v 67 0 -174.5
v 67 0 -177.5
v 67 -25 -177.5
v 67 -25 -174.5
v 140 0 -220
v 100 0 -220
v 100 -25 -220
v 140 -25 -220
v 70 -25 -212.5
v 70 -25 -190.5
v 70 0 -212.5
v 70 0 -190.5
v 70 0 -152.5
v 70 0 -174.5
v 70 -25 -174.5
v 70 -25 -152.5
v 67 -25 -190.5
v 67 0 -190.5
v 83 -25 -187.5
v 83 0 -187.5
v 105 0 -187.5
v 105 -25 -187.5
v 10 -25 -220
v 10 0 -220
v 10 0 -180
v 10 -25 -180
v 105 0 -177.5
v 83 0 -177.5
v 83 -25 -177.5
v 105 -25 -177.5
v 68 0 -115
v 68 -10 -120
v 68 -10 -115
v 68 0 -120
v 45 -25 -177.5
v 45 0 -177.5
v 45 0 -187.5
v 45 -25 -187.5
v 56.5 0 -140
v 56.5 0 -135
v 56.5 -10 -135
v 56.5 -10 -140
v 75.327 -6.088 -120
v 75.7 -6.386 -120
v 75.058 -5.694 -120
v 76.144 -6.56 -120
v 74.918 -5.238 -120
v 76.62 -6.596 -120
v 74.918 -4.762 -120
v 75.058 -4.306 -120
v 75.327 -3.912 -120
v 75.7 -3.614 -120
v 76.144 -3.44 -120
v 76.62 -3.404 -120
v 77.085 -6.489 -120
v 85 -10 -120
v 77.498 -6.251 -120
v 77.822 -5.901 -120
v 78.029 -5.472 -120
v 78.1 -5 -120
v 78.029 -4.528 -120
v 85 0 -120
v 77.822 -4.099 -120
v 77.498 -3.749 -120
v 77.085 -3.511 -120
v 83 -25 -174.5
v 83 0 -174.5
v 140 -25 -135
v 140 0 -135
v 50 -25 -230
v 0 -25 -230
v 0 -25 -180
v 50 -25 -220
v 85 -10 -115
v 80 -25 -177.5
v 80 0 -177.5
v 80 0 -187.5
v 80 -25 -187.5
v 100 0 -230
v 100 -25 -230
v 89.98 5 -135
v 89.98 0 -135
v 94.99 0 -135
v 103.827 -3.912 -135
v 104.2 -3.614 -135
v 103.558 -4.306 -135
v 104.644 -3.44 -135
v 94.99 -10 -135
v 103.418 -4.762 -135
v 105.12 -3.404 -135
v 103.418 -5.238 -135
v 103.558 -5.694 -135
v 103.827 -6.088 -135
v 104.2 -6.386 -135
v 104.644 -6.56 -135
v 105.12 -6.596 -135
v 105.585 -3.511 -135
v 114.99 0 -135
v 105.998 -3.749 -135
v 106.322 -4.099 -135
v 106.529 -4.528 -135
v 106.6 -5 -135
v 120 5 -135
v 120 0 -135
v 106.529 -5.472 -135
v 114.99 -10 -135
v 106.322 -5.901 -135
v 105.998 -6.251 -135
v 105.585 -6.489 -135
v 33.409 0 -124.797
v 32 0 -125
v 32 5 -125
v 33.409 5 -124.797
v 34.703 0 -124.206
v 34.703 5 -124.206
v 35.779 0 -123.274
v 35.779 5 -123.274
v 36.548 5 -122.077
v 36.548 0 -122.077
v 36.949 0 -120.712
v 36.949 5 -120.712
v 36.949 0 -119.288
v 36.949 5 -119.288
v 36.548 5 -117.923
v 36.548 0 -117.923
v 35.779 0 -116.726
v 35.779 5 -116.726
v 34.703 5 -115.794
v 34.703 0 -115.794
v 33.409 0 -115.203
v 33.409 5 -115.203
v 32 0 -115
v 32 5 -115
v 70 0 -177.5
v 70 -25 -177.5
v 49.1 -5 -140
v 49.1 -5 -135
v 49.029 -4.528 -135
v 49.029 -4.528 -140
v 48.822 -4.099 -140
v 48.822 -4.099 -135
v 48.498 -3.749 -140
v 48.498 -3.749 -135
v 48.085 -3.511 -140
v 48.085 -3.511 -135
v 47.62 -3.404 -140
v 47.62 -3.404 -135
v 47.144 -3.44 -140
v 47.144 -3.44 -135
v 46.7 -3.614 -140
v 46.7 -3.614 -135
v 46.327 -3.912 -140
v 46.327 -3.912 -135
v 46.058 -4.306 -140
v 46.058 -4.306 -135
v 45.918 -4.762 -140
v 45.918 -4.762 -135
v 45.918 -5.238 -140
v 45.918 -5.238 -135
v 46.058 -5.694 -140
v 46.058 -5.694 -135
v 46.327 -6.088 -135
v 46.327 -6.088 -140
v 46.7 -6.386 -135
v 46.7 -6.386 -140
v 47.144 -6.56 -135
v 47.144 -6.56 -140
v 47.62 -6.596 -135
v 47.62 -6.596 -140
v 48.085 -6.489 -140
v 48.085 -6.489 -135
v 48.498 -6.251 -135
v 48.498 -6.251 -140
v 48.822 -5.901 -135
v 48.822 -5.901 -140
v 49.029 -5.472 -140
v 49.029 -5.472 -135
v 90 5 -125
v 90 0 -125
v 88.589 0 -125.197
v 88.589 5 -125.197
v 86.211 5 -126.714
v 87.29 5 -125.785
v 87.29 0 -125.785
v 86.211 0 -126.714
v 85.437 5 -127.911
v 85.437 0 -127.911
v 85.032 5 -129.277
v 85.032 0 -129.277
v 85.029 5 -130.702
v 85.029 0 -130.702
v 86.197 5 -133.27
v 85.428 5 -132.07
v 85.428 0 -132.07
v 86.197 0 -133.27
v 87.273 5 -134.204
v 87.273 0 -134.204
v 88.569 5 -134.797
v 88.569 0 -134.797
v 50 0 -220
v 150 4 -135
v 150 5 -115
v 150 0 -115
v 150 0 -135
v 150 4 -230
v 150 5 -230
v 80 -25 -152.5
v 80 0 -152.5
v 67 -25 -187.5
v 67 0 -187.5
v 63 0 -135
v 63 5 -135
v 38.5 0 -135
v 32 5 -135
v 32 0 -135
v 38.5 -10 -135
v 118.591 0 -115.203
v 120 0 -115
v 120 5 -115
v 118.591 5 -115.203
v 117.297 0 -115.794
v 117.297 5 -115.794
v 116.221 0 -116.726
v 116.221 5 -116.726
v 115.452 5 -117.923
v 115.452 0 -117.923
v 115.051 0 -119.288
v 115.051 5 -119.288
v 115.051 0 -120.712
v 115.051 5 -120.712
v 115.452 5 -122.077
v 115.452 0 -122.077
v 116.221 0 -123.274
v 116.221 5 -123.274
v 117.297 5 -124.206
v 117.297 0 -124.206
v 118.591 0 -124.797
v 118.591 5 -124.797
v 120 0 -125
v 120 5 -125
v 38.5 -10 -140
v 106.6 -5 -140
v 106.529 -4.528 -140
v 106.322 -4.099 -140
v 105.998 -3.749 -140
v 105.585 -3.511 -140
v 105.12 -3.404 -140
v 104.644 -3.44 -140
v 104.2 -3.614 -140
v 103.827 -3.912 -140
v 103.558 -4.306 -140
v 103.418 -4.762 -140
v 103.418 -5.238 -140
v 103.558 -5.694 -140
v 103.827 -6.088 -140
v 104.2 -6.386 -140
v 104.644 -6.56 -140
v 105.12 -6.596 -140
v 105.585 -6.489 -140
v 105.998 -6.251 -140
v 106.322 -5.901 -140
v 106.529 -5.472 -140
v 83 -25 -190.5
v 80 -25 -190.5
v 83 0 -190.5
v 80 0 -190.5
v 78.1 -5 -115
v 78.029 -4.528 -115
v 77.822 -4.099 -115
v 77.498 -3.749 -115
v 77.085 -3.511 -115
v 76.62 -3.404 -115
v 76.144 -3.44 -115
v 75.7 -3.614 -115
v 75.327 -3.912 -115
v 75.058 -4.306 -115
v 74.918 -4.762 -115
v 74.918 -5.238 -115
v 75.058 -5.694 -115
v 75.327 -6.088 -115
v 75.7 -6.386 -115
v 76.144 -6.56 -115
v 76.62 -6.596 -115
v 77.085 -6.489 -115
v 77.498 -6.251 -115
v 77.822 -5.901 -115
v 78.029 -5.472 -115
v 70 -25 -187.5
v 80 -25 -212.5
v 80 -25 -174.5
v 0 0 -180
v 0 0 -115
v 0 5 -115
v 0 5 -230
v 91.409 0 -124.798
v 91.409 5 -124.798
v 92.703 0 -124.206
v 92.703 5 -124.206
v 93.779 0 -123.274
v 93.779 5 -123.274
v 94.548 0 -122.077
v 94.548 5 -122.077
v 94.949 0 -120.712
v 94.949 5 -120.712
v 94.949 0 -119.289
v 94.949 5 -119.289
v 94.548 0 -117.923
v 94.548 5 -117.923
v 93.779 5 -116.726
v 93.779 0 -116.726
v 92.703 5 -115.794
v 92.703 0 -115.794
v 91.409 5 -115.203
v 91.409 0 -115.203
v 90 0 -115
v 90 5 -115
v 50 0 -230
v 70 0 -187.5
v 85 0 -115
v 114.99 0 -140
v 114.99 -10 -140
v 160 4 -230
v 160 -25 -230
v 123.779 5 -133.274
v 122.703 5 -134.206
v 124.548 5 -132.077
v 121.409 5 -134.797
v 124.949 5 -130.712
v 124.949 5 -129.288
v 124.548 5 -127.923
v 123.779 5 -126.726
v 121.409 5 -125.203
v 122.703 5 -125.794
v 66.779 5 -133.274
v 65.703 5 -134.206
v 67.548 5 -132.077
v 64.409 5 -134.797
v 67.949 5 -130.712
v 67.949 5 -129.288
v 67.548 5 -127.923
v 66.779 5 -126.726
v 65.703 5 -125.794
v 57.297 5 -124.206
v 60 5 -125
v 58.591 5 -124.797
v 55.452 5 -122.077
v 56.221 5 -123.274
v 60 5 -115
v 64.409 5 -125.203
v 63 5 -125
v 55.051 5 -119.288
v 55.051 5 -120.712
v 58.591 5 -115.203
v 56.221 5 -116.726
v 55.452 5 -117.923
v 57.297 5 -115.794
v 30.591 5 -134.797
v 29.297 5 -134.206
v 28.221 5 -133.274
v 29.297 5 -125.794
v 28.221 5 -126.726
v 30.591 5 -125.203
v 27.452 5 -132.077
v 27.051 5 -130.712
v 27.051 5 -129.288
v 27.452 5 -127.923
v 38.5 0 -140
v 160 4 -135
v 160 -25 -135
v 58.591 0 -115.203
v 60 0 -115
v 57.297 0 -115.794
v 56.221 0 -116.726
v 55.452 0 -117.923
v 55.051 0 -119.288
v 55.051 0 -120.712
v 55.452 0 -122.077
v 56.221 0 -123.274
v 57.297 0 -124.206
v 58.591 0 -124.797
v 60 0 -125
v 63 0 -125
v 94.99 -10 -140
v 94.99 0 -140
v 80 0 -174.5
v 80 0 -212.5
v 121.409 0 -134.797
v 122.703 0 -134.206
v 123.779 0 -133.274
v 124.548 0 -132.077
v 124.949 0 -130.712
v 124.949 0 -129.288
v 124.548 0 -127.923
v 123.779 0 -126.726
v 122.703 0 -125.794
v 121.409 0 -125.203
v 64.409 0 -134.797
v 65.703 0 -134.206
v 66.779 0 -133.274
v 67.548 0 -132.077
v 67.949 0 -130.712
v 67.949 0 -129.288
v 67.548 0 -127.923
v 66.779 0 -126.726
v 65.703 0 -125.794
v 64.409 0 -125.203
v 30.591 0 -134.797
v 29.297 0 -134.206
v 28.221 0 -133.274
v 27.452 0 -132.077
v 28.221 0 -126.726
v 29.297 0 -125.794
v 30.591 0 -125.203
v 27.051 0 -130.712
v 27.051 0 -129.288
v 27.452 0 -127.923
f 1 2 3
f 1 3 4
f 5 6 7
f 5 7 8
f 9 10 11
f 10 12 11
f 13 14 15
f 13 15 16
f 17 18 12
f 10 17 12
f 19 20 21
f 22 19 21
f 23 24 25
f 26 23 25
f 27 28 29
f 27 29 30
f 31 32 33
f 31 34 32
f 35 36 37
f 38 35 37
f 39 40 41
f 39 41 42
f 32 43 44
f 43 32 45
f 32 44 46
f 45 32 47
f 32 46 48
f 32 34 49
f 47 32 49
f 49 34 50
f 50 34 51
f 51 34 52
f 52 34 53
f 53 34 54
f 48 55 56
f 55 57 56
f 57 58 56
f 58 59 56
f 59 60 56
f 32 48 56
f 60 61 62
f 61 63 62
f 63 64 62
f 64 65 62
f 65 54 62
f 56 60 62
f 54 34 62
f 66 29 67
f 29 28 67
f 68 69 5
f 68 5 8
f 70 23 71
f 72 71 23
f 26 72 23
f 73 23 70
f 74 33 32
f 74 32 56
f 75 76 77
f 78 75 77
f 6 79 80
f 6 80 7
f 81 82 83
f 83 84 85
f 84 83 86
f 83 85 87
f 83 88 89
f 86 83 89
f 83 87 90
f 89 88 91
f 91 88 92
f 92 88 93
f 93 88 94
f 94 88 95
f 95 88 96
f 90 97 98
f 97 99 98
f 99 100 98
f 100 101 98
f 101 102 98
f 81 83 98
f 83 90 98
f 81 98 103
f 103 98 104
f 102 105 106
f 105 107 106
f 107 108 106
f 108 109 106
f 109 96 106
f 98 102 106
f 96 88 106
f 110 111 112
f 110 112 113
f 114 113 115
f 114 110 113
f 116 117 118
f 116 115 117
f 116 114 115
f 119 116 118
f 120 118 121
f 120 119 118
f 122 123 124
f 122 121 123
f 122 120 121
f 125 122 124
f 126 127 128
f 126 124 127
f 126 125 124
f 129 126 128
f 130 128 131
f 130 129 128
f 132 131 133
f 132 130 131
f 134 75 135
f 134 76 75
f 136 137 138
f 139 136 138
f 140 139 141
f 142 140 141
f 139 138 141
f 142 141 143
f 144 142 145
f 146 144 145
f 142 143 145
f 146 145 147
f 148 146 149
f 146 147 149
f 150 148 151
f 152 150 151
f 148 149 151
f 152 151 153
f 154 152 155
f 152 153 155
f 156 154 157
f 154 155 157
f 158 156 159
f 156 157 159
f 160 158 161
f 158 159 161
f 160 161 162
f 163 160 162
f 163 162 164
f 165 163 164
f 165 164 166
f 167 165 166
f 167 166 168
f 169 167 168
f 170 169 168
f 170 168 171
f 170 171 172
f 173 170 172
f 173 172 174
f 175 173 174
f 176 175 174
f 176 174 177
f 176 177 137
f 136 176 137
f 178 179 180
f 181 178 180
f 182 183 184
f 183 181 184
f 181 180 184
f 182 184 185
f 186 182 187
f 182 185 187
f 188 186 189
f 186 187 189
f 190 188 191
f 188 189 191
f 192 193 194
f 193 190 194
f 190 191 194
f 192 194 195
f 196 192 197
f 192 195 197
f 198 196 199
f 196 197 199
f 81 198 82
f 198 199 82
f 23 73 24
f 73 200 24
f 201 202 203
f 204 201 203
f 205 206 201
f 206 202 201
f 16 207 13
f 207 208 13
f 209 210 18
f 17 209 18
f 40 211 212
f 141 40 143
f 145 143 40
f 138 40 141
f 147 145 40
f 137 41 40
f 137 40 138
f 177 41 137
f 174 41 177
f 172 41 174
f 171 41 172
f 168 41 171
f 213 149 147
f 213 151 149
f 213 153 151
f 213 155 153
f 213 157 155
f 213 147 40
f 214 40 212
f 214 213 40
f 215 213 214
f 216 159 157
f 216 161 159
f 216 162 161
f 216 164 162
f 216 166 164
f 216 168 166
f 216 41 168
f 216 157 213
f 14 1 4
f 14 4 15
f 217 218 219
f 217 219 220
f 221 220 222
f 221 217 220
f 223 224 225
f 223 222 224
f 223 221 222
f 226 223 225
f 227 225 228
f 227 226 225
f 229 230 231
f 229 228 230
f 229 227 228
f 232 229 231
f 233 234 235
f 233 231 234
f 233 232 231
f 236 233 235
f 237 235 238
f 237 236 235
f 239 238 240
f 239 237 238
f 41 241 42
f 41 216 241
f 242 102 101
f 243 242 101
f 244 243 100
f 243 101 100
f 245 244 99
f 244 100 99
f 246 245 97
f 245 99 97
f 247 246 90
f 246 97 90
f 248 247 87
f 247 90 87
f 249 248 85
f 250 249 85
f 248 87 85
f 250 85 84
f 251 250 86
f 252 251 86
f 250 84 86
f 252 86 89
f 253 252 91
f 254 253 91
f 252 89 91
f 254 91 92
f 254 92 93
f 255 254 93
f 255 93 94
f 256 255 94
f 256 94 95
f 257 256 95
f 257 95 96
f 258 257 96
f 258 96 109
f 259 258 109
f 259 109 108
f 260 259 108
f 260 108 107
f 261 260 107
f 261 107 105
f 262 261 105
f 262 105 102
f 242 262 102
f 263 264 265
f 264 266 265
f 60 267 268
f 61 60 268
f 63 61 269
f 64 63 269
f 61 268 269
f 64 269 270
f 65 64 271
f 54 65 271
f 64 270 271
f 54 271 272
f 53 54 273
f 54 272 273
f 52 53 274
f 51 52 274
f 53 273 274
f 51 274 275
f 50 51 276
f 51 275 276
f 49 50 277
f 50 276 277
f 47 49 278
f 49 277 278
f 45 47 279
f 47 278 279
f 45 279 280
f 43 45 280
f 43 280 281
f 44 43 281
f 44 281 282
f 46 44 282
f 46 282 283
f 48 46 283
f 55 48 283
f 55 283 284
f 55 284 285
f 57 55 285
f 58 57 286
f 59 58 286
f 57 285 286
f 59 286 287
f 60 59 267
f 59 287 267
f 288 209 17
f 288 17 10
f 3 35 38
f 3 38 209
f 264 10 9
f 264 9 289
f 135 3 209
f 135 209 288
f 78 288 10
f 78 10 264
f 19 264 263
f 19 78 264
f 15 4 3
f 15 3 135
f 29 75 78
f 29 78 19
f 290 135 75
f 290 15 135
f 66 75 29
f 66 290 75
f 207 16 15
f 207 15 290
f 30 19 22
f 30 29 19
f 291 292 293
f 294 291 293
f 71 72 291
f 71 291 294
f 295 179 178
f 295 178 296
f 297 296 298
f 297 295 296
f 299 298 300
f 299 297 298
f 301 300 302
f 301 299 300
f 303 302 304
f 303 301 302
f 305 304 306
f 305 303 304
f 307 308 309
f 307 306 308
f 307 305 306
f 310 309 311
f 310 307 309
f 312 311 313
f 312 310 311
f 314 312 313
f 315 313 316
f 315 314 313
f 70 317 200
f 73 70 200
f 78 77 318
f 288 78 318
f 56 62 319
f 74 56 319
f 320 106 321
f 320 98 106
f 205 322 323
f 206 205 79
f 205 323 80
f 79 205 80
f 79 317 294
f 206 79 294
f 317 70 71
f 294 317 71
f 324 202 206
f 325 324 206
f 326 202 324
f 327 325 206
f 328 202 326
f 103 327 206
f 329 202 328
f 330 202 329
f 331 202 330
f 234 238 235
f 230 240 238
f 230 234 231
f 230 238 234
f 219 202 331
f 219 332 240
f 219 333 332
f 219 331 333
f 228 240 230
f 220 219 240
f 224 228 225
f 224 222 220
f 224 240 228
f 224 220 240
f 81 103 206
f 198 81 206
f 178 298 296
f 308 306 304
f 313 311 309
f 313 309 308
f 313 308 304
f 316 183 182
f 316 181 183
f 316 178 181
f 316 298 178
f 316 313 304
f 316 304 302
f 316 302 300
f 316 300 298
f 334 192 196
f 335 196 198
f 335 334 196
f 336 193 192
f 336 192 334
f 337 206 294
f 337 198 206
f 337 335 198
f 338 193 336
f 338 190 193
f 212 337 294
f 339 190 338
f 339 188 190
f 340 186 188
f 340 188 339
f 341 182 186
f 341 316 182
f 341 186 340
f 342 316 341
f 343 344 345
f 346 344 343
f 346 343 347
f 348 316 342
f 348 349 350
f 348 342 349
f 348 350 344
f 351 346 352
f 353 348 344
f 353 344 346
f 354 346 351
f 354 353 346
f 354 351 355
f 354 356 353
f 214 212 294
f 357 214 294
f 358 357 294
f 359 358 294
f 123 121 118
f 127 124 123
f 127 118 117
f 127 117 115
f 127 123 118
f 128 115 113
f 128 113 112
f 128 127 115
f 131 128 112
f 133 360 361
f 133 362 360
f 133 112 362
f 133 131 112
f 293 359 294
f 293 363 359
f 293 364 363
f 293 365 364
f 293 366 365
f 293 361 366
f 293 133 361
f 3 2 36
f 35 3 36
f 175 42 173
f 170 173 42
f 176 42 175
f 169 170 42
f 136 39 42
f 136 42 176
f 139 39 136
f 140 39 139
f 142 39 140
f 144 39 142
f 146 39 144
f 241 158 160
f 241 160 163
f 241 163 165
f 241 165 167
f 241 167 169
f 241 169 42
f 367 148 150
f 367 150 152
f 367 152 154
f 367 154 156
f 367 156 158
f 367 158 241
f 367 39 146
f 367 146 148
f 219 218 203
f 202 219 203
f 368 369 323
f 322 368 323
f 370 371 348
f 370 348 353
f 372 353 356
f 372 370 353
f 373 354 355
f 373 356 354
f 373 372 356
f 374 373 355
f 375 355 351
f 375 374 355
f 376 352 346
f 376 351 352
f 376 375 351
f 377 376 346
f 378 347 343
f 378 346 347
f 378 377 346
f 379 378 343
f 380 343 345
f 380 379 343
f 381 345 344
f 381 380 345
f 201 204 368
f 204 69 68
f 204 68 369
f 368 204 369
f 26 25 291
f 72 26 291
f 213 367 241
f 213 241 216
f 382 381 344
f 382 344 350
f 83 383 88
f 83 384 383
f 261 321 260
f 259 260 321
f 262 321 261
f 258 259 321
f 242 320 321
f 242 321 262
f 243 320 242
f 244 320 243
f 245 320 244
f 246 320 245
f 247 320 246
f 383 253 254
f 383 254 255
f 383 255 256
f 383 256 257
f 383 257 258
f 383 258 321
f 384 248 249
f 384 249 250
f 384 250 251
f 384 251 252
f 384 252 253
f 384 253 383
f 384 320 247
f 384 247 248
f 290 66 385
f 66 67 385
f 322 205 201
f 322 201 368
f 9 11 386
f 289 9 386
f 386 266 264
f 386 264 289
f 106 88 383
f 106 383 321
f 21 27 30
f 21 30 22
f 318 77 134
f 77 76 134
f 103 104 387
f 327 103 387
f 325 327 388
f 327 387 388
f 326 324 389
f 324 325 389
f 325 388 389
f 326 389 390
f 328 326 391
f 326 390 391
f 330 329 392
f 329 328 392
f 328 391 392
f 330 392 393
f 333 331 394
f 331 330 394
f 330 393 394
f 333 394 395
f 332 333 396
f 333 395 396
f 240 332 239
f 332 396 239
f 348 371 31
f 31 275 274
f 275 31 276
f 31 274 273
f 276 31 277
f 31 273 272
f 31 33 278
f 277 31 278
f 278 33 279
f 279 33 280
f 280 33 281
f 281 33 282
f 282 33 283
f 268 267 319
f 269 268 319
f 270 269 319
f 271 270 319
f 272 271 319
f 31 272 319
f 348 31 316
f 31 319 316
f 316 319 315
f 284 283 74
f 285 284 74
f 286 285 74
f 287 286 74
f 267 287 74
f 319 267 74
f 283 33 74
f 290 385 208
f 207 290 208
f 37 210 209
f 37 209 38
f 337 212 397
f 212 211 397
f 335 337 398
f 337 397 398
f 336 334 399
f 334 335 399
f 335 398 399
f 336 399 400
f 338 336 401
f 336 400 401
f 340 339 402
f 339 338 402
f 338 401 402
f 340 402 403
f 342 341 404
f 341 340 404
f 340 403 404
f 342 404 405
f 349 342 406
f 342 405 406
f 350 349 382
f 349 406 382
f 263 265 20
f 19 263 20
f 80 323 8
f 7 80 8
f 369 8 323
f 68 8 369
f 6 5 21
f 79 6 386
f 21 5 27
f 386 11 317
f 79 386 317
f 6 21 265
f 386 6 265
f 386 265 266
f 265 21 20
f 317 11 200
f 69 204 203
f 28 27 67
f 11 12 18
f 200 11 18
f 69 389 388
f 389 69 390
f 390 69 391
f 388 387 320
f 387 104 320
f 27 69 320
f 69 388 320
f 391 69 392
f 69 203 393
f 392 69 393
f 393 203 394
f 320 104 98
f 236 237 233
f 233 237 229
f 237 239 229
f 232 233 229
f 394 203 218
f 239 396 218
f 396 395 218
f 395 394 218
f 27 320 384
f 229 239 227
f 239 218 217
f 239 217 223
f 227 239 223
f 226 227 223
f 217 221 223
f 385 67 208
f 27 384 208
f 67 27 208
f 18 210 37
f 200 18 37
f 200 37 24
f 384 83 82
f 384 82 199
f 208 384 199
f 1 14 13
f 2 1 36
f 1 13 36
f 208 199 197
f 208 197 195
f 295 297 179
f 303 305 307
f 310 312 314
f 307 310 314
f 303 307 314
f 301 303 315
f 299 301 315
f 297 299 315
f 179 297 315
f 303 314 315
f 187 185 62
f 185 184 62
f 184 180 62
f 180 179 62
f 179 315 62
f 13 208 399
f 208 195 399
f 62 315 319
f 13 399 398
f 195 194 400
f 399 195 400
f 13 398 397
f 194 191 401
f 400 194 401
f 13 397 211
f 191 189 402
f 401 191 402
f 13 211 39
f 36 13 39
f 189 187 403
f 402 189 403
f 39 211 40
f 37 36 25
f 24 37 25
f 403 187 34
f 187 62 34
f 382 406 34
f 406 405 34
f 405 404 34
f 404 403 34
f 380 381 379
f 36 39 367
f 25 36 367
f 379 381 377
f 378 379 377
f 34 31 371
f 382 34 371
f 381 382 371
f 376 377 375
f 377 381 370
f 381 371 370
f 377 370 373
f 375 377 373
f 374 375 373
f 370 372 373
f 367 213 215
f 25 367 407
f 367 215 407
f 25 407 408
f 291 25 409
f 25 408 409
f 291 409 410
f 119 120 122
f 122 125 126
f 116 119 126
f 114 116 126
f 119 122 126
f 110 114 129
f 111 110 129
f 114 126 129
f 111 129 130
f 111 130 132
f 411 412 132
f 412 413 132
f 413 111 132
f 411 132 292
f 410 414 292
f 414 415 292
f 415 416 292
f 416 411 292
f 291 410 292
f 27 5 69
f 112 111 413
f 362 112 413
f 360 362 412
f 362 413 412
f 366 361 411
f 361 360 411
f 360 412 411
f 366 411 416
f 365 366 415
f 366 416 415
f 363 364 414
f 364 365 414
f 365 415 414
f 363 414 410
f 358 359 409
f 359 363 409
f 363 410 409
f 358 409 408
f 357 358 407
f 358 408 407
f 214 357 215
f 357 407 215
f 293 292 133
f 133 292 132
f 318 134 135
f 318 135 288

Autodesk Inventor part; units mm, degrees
ref_plane "YZ Plane" through (0, 0, 0) normal (1, 0, 0) x (0, 1, 0)
ref_plane "XZ Plane" through (0, 0, 0) normal (0, 1, 0) x (-1, 0, 0)
ref_plane "XY Plane" through (0, 0, 0) normal (0, 0, 1) x (1, 0, 0)
sketch "puzzle" plane through (0, 0, 0) normal (0, 1, 0) x (-1, 0, 0)
  line L0 (0, -115) -> (-15, -115)
  line L1 (-135, -115) -> (-125, -115)
  line L2 (-135, -115) -> (-150, -115)
  line L3 (-75, -115) -> (-65, -115)
  line L4 (-75, -115) -> (-85.0002, -115)
  line L5 (-105, -135) -> (-94.9796, -135)
  line L6 (-94.9796, -135) -> (-115, -135)
  line L7 (-65, -115) -> (-60, -115)
  line L8 (-60, -125) -> (-63, -125)
  arc A0 (-60, -125) -> (-60, -115) centre (-60, -120) ccw
  arc A1 (-63, -125) -> (-63, -135) centre (-63, -130) ccw
  line L9 (-85.0002, -115) -> (-90.0002, -115)
  line L10 (-94.9796, -135) -> (-89.9796, -135)
  arc A2 (-90.0002, -115) -> (-90, -125) centre (-90.0002, -120) ccw
  arc A3 (-89.9796, -135) -> (-90, -125) centre (-89.9796, -130) ccw
  line L11 (-115, -135) -> (-120, -135)
  line L12 (-125, -115) -> (-120, -115)
  arc A4 (-120, -125) -> (-120, -115) centre (-120, -120) ccw
  arc A5 (-120, -125) -> (-120, -135) centre (-120, -130) ccw
  line L13 (0, -115) -> (-30, -115)
  line L14 (-63, -135) -> (-32.98, -135)
  line L15 (-32.98, -135) -> (-32, -135)
  line L16 (-30, -115) -> (-32, -115)
  arc A6 (-32, -115) -> (-32, -125) centre (-32, -120) ccw
  arc A7 (-32, -135) -> (-32, -125) centre (-32, -130) ccw
  line L17 (0, -115) -> (0, -230)
  line L18 (0, -230) -> (-150, -230)
  line L19 (-150, -230) -> (-150, -115)
  point P0 (0, 0)
  dimension "d22" = 5
  dimension "d23" = 5
  dimension "d24" = 5
  dimension "d25" = 5
  dimension "d26" = 5
  dimension "d76" = 115
extrude "Extrusión4" add sketch "puzzle" along normal blind 5
sketch "Boceto4" plane through (0, 0, 0) normal (0, -1, 0) x (1, 0, 0)
  line L0 (0, -115) -> (0, -230) projected
  line L1 (32, -115) -> (0, -115) projected
  line L2 (0, -230) -> (10, -230)
  line L3 (150, -230) -> (0, -230) projected
  line L4 (10, -180) -> (0, -180)
  line L5 (0, -230) -> (0, -180)
  line L6 (10, -230) -> (50, -230)
  line L7 (50, -230) -> (50, -220)
  line L8 (50, -220) -> (10, -220)
  line L9 (10, -220) -> (10, -180)
  line L10 (150, -230) -> (100, -230)
  line L11 (100, -230) -> (100, -220)
  line L12 (100, -220) -> (140, -220)
  line L13 (140, -220) -> (140, -180)
  line L14 (140, -180) -> (150, -180)
  line L15 (150, -115) -> (150, -230) projected
  line L16 (150, -230) -> (150, -180)
  line L17 (70, -212.5) -> (80, -212.5)
  line L18 (80, -152.5) -> (70, -152.5)
  line L19 (45, -177.5) -> (45, -187.5)
  line L20 (105, -177.5) -> (105, -187.5)
  line L21 (83, -177.5) -> (83, -174.5)
  line L22 (83, -174.5) -> (80, -174.5)
  line L23 (80, -174.5) -> (80, -152.5)
  line L24 (83, -177.5) -> (105, -177.5)
  line L25 (80, -177.5) -> (80, -187.5)
  line L26 (80, -177.5) -> (70, -177.5)
  line L27 (67, -177.5) -> (67, -174.5)
  line L28 (67, -174.5) -> (70, -174.5)
  line L29 (67, -187.5) -> (67, -190.5)
  line L30 (67, -190.5) -> (70, -190.5)
  line L31 (67, -177.5) -> (45, -177.5)
  line L32 (67, -187.5) -> (45, -187.5)
  line L33 (70, -174.5) -> (70, -152.5)
  line L34 (70, -177.5) -> (70, -182.5)
  line L35 (70, -190.5) -> (70, -212.5)
  line L36 (80, -187.5) -> (70, -187.5)
  line L37 (70, -187.5) -> (70, -182.5)
  line L38 (80, -190.5) -> (83, -190.5)
  line L39 (83, -190.5) -> (83, -187.5)
  line L40 (80, -190.5) -> (80, -212.5)
  line L41 (83, -187.5) -> (105, -187.5)
  point P0 (0, 0)
extrude "Extrusión5" add sketch "Boceto4" along normal blind 25
sketch "Boceto5" plane through (0, 0, 0) normal (0, -1, 0) x (1, 0, 0)
  line L0 (85, -115) -> (68, -115)
  line L1 (68, -120) -> (85, -120)
  line L2 (68, -120) -> (68, -115)
  line L3 (85, -120) -> (85, -115)
  line L4 (32, -135) -> (63, -135) projected
  line L5 (47.5, -135) -> (38.5, -135)
  line L6 (38.5, -135) -> (56.5, -135)
  line L7 (56.5, -135) -> (56.5, -140)
  line L8 (56.5, -140) -> (38.5, -140)
  line L9 (38.5, -140) -> (38.5, -135)
  line L10 (120, -135) -> (89.9796, -135) projected
  line L11 (104.9898, -135) -> (94.9898, -135)
  line L12 (94.9898, -135) -> (104.9898, -135)
  line L13 (104.9898, -135) -> (114.9898, -135)
  line L14 (114.9898, -135) -> (114.9898, -140)
  line L15 (114.9898, -140) -> (94.9898, -140)
  line L16 (94.9898, -140) -> (94.9898, -135)
  point P0 (0, 0)
extrude "Extrusión6" add sketch "Boceto5" along normal blind 10
sketch "Boceto6" plane through (89.9796, 5, -135) normal (0, 0, 1) x (1, 0, 0)
  line L0 (10.0204, -5) -> (50.0204, -5) projected
  line L1 (25, -5) -> (15, -5)
  line L2 (25.0102, -5) -> (25.0102, -15) projected
  line L3 (25.0102, -5) -> (25.0102, -15)
  line L4 (25.0102, -15) -> (5.0102, -15) projected
  line L5 (25.0102, -15) -> (5.0102, -15)
  line L6 (15.0204, -5) -> (15.0204, -30) projected
  circle A0 centre (15.0204, -10) radius 1.6
  line L7 (-33.4796, -15) -> (-51.4796, -15) projected
  line L8 (-33.4796, -15) -> (-51.4796, -15)
  circle A1 centre (-42.4796, -10) radius 1.6
  point P0 (-89.9796, -5)
  dimension "d120" = 10
  dimension "d121" = 3.2
  dimension "d123" = 3.2
extrude "Extrusión7" cut sketch "Boceto6" against normal blind 10 contours A0 L6 | L6 A0 | A1
sketch "Boceto7" plane through (32, 5, -135) normal (0, 0, 1) x (1, 0, 0)
  circle A0 centre (15.5, -10) radius 1.6 projected
  circle A1 centre (15.5, -10) radius 1.6
  point P0 (-32, -5)
extrude "Extrusión8" cut sketch "Boceto7" against normal blind 34
sketch "Boceto8" plane through (68, 0, -115) normal (0, 0, 1) x (1, 0, 0)
  line L0 (22.0002, 0) -> (-8, 0) projected
  line L1 (17, 0) -> (0, 0)
  line L2 (0, 0) -> (0, -10)
  line L3 (0, -10) -> (17, -10)
  line L4 (17, -10) -> (17, 0)
  circle A0 centre (8.5, -5) radius 1.6
  point P0 (-68, 0)
  dimension "d128" = 3.2
extrude "Extrusión9" cut sketch "Boceto8" against normal blind 5 contours A0
sketch "Boceto9" plane through (150, 0, -115) normal (1, 0, 0) x (0, 0, -1)
  line L0 (115, 5) -> (115, -25) projected
  line L1 (20, 0) -> (10, 0) projected
  line L2 (115, 0) -> (20, 0)
  line L3 (20, 0) -> (20, -25)
  line L4 (115, -25) -> (65, -25) projected
  line L5 (20, -25) -> (115, -25)
  line L6 (115, -25) -> (115, 0)
  line L7 (115, 5) -> (115, -25) projected
  point P0 (-115, 0)
sketch "Boceto10" plane through (140, 0, -180) normal (0, 0, 1) x (1, 0, 0)
  line L0 (0, 0) -> (0, -25) projected
  line L1 (10, 5) -> (10, -25) projected
  line L2 (0, 0) -> (10, 0)
  line L3 (10, 0) -> (10, -25)
  line L4 (10, -25) -> (0, -25)
  line L5 (0, -25) -> (0, 0)
  point P0 (-140, 0)
extrude "Extrusión10" add sketch "Boceto10" along normal blind 45
extrude "Extrusión11" add sketch "Boceto9" along normal blind 10
sketch "Boceto12" plane through (150, 0, -135) normal (0, 1, 0) x (1, 0, 0)
  line L0 (0, 0) -> (0, 95) projected
  line L1 (0, 0) -> (10, 0)
  line L2 (10, 0) -> (10, 95)
  line L3 (10, 95) -> (0, 95)
  line L4 (0, 95) -> (0, 0)
  point P0 (-150, -135)
extrude "Extrusión12" add sketch "Boceto12" along normal blind 4
properties part number "base auxiliar 2"
